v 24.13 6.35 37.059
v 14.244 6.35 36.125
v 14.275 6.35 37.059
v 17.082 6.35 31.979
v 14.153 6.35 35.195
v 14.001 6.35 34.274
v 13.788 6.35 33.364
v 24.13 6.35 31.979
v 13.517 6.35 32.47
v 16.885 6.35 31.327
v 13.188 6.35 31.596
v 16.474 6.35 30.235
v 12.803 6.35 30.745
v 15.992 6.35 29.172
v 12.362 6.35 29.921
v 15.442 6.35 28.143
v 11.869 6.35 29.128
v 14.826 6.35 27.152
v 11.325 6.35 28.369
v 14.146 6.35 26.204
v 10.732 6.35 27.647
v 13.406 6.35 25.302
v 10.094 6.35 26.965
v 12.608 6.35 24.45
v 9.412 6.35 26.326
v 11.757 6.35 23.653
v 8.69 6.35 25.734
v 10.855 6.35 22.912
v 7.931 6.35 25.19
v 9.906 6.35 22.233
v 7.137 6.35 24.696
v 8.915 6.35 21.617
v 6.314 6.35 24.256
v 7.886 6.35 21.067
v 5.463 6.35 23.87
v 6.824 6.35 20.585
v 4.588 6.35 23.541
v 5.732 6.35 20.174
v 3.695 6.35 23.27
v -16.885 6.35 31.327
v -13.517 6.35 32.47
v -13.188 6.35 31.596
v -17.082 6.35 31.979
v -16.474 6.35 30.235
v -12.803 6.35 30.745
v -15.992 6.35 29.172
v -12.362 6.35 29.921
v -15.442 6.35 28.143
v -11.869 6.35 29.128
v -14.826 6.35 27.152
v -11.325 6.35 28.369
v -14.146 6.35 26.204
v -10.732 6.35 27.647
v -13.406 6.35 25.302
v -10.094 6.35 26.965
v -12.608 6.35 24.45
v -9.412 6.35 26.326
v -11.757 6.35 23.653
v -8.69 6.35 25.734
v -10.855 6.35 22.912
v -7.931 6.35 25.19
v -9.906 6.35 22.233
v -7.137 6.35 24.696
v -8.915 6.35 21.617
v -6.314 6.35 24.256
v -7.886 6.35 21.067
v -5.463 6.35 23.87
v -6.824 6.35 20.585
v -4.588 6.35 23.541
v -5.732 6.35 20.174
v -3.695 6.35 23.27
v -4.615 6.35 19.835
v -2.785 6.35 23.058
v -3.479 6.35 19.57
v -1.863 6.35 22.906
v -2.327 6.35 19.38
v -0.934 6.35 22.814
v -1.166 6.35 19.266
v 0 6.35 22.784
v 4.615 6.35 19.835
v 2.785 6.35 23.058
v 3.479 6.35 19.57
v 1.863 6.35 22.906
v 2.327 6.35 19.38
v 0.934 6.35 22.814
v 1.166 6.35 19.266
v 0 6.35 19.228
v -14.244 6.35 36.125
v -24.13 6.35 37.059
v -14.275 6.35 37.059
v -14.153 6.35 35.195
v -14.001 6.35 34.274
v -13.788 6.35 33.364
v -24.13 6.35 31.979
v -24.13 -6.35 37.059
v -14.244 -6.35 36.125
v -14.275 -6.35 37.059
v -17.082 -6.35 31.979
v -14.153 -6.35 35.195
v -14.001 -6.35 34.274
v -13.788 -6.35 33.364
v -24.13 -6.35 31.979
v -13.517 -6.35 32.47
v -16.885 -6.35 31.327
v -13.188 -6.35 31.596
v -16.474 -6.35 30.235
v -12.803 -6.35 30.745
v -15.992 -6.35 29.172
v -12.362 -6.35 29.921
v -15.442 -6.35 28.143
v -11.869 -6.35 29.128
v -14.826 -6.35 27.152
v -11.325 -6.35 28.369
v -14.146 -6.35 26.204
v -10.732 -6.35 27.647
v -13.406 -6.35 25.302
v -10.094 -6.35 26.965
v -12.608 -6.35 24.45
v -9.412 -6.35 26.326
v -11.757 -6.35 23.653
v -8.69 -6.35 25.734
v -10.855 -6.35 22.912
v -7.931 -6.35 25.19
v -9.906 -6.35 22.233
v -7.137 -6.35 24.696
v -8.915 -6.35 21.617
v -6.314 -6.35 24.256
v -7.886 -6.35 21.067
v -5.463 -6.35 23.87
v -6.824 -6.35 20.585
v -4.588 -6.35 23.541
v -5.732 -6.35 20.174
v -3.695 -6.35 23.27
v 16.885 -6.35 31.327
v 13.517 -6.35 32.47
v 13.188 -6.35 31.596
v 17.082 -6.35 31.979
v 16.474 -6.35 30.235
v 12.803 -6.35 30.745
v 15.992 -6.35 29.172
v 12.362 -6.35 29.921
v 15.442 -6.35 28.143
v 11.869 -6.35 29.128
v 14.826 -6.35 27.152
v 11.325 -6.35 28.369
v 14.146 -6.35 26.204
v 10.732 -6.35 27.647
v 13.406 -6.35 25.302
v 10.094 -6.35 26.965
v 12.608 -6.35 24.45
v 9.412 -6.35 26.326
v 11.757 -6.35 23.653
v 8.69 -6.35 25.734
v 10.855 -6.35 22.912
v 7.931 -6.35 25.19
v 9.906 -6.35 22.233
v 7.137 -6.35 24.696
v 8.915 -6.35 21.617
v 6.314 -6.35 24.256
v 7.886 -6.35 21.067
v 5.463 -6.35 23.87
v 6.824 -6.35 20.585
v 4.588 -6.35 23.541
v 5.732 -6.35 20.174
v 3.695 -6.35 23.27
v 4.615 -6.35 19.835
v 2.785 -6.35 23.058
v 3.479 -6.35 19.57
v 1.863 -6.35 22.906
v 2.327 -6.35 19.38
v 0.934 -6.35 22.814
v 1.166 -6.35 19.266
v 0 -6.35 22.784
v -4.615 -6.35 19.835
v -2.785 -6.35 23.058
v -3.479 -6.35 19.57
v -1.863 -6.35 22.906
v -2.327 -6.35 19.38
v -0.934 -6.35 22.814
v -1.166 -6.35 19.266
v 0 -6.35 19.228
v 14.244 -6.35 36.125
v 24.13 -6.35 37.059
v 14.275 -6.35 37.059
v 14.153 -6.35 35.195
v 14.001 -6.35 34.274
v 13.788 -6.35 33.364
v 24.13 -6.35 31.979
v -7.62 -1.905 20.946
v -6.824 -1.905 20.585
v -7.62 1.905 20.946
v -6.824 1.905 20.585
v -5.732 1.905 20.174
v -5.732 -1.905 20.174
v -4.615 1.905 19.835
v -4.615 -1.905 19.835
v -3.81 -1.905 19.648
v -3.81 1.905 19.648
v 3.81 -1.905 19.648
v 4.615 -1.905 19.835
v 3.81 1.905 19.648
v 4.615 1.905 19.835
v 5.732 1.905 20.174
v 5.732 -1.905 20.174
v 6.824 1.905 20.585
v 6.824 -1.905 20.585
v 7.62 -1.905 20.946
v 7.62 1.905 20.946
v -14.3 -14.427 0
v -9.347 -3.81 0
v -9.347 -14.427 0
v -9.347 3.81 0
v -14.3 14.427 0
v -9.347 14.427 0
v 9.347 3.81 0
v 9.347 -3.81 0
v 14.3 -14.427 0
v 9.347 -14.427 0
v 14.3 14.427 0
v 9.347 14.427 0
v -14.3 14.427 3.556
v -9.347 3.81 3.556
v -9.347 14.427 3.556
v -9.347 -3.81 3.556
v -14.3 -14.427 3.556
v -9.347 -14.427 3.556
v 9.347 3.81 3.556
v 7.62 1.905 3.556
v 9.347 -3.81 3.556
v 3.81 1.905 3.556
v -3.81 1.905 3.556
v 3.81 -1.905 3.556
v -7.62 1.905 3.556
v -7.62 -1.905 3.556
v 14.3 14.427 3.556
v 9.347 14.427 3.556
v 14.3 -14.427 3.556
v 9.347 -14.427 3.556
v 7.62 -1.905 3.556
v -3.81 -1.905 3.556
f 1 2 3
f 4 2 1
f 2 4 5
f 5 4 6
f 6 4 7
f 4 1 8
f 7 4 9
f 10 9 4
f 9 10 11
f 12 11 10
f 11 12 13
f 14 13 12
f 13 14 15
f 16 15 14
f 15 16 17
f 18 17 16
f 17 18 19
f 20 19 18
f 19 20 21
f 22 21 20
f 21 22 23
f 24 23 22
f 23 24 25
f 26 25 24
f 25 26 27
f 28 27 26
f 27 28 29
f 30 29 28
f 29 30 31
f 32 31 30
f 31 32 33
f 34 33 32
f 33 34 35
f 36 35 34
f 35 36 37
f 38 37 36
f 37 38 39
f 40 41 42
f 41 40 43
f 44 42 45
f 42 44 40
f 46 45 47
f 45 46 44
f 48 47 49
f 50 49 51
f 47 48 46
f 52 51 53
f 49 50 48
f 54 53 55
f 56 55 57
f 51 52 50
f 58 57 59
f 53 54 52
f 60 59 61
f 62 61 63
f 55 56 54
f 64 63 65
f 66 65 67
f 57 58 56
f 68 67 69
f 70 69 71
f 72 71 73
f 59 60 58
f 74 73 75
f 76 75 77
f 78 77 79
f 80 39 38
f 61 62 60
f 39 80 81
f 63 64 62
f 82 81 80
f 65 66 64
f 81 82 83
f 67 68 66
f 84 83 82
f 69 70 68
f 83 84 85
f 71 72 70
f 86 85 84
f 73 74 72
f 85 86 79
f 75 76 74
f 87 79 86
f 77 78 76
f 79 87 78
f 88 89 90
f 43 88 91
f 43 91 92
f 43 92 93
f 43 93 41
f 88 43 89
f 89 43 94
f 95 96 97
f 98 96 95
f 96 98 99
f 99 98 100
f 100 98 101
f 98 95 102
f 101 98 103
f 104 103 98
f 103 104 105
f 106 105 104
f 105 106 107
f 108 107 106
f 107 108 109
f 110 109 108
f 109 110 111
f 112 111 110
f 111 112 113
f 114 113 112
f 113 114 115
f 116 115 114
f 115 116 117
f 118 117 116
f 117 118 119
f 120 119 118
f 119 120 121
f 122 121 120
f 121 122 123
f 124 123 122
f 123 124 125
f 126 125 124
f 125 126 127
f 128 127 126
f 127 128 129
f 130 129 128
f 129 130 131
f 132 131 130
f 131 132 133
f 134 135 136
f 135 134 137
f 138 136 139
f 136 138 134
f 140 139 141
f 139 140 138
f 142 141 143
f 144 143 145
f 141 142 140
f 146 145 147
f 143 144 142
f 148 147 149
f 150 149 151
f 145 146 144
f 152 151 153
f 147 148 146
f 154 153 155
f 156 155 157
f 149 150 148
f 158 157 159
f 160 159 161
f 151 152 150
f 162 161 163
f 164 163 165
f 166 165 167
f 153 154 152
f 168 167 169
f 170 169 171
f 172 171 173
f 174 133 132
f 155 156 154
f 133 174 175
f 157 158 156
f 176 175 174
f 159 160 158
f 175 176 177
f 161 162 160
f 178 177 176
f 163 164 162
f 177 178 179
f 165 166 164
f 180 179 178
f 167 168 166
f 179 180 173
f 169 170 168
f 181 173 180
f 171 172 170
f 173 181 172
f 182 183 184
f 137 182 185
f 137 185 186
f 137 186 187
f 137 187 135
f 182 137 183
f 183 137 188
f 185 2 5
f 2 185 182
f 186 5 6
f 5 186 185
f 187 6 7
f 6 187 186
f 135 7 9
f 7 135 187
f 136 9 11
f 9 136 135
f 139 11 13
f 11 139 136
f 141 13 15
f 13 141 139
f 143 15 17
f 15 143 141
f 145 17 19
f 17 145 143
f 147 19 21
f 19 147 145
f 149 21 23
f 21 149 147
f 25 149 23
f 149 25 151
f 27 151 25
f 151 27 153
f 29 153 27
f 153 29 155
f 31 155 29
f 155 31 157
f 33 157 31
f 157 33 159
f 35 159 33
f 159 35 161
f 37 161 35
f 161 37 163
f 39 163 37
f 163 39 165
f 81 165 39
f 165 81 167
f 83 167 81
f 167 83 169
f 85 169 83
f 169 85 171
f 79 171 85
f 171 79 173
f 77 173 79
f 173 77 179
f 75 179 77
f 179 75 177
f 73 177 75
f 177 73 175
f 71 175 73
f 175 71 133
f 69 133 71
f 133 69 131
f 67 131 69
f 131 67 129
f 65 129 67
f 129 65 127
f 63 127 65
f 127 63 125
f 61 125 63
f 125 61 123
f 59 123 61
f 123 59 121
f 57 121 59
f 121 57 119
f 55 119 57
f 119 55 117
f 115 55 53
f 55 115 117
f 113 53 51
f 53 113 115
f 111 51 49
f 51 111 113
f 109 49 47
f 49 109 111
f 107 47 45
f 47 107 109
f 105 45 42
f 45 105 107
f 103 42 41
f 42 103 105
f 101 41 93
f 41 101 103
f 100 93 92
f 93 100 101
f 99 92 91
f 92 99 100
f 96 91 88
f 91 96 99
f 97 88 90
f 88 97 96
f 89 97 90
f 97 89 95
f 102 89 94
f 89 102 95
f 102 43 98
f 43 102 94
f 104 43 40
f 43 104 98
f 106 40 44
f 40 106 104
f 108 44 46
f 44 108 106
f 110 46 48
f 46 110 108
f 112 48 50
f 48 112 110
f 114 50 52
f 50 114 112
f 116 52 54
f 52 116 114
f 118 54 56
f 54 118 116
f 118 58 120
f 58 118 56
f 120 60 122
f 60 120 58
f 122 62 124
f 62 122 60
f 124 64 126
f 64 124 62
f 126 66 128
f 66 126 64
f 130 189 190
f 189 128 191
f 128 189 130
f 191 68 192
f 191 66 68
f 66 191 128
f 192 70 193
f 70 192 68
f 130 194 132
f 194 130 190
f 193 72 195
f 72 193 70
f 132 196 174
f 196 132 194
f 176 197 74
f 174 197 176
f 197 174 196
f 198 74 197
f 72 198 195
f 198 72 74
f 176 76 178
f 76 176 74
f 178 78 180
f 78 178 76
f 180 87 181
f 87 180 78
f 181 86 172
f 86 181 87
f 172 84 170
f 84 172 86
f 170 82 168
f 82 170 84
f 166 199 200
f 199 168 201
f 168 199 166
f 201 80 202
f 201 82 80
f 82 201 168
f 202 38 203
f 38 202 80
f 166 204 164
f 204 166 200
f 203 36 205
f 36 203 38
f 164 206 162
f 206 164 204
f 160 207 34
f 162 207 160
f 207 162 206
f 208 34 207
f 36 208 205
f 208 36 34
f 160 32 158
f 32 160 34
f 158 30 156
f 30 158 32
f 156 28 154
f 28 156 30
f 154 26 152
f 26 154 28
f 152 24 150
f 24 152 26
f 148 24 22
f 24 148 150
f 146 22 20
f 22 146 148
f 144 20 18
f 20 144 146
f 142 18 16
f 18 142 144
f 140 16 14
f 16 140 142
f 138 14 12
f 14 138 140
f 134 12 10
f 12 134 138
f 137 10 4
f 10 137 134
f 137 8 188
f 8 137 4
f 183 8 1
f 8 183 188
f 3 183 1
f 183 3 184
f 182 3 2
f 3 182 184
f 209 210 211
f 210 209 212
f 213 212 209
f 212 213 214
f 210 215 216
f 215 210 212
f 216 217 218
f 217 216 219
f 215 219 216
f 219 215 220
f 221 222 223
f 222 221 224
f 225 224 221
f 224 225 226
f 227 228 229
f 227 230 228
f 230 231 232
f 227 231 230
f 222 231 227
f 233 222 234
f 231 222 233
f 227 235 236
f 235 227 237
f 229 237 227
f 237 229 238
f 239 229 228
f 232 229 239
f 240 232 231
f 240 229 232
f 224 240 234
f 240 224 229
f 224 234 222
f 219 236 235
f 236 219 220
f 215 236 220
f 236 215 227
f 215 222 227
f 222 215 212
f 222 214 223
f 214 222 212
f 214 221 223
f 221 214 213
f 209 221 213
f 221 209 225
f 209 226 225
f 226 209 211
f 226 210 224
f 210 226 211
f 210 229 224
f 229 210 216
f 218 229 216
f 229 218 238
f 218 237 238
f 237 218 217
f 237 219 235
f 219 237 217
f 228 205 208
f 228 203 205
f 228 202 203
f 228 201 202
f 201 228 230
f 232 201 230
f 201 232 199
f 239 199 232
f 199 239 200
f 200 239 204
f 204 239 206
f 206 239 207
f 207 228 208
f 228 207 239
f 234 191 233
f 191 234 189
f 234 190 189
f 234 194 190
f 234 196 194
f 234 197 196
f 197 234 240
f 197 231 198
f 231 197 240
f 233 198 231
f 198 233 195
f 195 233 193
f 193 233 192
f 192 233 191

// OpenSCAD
ViewScale = [0.0254, 0.0254, 0.0254];

module aspheric_mount()
{
    translate([0, 250, 995 + 264 + 200])
    rotate([90, 0, 0])
    linear_extrude(500) {
        difference() {
            circle(1404/2, $fn=96);
            circle(1104/2+10, $fn=96);
            translate([-1000, 0, 0])
            square([2000, 1100]);
        }
        translate([-800, -100, 0])
        square([300, 200], center=true);

        translate([800, -100, 0])
        square([300, 200], center=true);
    }
    linear_extrude(140)
    difference() {
        square([1126, 1136], center=true);
        translate([0, 500, 0])
        square([736, 700], center=true);
        translate([0, -500, 0])
        square([736, 700], center=true);
    }

    linear_extrude(900)
    translate([0, 0, 150])
    difference() {
        square([600, 150], center=true);
        square([300, 150], center=true);
    }

    translate([0, 0, 264 + 995 + 200])
    square([100, 100], center=true);

//    linear_extrude(165)
//    difference() {
//        circle(500, $fn=96);
//        circle(260, $fn=6);
//    }
//    translate([0, 0, 164])
//    linear_extrude(51)
//    difference() {
//        circle(500, $fn=96);
//        circle(130, $fn=96);
//    }
//
//    translate([0, 0, 214])
//    linear_extrude(430)
//    difference() {
//        circle(300, $fn=96);
//        circle(150, $fn=96);
//    }
}

scale(ViewScale)
{
    aspheric_mount();
}
